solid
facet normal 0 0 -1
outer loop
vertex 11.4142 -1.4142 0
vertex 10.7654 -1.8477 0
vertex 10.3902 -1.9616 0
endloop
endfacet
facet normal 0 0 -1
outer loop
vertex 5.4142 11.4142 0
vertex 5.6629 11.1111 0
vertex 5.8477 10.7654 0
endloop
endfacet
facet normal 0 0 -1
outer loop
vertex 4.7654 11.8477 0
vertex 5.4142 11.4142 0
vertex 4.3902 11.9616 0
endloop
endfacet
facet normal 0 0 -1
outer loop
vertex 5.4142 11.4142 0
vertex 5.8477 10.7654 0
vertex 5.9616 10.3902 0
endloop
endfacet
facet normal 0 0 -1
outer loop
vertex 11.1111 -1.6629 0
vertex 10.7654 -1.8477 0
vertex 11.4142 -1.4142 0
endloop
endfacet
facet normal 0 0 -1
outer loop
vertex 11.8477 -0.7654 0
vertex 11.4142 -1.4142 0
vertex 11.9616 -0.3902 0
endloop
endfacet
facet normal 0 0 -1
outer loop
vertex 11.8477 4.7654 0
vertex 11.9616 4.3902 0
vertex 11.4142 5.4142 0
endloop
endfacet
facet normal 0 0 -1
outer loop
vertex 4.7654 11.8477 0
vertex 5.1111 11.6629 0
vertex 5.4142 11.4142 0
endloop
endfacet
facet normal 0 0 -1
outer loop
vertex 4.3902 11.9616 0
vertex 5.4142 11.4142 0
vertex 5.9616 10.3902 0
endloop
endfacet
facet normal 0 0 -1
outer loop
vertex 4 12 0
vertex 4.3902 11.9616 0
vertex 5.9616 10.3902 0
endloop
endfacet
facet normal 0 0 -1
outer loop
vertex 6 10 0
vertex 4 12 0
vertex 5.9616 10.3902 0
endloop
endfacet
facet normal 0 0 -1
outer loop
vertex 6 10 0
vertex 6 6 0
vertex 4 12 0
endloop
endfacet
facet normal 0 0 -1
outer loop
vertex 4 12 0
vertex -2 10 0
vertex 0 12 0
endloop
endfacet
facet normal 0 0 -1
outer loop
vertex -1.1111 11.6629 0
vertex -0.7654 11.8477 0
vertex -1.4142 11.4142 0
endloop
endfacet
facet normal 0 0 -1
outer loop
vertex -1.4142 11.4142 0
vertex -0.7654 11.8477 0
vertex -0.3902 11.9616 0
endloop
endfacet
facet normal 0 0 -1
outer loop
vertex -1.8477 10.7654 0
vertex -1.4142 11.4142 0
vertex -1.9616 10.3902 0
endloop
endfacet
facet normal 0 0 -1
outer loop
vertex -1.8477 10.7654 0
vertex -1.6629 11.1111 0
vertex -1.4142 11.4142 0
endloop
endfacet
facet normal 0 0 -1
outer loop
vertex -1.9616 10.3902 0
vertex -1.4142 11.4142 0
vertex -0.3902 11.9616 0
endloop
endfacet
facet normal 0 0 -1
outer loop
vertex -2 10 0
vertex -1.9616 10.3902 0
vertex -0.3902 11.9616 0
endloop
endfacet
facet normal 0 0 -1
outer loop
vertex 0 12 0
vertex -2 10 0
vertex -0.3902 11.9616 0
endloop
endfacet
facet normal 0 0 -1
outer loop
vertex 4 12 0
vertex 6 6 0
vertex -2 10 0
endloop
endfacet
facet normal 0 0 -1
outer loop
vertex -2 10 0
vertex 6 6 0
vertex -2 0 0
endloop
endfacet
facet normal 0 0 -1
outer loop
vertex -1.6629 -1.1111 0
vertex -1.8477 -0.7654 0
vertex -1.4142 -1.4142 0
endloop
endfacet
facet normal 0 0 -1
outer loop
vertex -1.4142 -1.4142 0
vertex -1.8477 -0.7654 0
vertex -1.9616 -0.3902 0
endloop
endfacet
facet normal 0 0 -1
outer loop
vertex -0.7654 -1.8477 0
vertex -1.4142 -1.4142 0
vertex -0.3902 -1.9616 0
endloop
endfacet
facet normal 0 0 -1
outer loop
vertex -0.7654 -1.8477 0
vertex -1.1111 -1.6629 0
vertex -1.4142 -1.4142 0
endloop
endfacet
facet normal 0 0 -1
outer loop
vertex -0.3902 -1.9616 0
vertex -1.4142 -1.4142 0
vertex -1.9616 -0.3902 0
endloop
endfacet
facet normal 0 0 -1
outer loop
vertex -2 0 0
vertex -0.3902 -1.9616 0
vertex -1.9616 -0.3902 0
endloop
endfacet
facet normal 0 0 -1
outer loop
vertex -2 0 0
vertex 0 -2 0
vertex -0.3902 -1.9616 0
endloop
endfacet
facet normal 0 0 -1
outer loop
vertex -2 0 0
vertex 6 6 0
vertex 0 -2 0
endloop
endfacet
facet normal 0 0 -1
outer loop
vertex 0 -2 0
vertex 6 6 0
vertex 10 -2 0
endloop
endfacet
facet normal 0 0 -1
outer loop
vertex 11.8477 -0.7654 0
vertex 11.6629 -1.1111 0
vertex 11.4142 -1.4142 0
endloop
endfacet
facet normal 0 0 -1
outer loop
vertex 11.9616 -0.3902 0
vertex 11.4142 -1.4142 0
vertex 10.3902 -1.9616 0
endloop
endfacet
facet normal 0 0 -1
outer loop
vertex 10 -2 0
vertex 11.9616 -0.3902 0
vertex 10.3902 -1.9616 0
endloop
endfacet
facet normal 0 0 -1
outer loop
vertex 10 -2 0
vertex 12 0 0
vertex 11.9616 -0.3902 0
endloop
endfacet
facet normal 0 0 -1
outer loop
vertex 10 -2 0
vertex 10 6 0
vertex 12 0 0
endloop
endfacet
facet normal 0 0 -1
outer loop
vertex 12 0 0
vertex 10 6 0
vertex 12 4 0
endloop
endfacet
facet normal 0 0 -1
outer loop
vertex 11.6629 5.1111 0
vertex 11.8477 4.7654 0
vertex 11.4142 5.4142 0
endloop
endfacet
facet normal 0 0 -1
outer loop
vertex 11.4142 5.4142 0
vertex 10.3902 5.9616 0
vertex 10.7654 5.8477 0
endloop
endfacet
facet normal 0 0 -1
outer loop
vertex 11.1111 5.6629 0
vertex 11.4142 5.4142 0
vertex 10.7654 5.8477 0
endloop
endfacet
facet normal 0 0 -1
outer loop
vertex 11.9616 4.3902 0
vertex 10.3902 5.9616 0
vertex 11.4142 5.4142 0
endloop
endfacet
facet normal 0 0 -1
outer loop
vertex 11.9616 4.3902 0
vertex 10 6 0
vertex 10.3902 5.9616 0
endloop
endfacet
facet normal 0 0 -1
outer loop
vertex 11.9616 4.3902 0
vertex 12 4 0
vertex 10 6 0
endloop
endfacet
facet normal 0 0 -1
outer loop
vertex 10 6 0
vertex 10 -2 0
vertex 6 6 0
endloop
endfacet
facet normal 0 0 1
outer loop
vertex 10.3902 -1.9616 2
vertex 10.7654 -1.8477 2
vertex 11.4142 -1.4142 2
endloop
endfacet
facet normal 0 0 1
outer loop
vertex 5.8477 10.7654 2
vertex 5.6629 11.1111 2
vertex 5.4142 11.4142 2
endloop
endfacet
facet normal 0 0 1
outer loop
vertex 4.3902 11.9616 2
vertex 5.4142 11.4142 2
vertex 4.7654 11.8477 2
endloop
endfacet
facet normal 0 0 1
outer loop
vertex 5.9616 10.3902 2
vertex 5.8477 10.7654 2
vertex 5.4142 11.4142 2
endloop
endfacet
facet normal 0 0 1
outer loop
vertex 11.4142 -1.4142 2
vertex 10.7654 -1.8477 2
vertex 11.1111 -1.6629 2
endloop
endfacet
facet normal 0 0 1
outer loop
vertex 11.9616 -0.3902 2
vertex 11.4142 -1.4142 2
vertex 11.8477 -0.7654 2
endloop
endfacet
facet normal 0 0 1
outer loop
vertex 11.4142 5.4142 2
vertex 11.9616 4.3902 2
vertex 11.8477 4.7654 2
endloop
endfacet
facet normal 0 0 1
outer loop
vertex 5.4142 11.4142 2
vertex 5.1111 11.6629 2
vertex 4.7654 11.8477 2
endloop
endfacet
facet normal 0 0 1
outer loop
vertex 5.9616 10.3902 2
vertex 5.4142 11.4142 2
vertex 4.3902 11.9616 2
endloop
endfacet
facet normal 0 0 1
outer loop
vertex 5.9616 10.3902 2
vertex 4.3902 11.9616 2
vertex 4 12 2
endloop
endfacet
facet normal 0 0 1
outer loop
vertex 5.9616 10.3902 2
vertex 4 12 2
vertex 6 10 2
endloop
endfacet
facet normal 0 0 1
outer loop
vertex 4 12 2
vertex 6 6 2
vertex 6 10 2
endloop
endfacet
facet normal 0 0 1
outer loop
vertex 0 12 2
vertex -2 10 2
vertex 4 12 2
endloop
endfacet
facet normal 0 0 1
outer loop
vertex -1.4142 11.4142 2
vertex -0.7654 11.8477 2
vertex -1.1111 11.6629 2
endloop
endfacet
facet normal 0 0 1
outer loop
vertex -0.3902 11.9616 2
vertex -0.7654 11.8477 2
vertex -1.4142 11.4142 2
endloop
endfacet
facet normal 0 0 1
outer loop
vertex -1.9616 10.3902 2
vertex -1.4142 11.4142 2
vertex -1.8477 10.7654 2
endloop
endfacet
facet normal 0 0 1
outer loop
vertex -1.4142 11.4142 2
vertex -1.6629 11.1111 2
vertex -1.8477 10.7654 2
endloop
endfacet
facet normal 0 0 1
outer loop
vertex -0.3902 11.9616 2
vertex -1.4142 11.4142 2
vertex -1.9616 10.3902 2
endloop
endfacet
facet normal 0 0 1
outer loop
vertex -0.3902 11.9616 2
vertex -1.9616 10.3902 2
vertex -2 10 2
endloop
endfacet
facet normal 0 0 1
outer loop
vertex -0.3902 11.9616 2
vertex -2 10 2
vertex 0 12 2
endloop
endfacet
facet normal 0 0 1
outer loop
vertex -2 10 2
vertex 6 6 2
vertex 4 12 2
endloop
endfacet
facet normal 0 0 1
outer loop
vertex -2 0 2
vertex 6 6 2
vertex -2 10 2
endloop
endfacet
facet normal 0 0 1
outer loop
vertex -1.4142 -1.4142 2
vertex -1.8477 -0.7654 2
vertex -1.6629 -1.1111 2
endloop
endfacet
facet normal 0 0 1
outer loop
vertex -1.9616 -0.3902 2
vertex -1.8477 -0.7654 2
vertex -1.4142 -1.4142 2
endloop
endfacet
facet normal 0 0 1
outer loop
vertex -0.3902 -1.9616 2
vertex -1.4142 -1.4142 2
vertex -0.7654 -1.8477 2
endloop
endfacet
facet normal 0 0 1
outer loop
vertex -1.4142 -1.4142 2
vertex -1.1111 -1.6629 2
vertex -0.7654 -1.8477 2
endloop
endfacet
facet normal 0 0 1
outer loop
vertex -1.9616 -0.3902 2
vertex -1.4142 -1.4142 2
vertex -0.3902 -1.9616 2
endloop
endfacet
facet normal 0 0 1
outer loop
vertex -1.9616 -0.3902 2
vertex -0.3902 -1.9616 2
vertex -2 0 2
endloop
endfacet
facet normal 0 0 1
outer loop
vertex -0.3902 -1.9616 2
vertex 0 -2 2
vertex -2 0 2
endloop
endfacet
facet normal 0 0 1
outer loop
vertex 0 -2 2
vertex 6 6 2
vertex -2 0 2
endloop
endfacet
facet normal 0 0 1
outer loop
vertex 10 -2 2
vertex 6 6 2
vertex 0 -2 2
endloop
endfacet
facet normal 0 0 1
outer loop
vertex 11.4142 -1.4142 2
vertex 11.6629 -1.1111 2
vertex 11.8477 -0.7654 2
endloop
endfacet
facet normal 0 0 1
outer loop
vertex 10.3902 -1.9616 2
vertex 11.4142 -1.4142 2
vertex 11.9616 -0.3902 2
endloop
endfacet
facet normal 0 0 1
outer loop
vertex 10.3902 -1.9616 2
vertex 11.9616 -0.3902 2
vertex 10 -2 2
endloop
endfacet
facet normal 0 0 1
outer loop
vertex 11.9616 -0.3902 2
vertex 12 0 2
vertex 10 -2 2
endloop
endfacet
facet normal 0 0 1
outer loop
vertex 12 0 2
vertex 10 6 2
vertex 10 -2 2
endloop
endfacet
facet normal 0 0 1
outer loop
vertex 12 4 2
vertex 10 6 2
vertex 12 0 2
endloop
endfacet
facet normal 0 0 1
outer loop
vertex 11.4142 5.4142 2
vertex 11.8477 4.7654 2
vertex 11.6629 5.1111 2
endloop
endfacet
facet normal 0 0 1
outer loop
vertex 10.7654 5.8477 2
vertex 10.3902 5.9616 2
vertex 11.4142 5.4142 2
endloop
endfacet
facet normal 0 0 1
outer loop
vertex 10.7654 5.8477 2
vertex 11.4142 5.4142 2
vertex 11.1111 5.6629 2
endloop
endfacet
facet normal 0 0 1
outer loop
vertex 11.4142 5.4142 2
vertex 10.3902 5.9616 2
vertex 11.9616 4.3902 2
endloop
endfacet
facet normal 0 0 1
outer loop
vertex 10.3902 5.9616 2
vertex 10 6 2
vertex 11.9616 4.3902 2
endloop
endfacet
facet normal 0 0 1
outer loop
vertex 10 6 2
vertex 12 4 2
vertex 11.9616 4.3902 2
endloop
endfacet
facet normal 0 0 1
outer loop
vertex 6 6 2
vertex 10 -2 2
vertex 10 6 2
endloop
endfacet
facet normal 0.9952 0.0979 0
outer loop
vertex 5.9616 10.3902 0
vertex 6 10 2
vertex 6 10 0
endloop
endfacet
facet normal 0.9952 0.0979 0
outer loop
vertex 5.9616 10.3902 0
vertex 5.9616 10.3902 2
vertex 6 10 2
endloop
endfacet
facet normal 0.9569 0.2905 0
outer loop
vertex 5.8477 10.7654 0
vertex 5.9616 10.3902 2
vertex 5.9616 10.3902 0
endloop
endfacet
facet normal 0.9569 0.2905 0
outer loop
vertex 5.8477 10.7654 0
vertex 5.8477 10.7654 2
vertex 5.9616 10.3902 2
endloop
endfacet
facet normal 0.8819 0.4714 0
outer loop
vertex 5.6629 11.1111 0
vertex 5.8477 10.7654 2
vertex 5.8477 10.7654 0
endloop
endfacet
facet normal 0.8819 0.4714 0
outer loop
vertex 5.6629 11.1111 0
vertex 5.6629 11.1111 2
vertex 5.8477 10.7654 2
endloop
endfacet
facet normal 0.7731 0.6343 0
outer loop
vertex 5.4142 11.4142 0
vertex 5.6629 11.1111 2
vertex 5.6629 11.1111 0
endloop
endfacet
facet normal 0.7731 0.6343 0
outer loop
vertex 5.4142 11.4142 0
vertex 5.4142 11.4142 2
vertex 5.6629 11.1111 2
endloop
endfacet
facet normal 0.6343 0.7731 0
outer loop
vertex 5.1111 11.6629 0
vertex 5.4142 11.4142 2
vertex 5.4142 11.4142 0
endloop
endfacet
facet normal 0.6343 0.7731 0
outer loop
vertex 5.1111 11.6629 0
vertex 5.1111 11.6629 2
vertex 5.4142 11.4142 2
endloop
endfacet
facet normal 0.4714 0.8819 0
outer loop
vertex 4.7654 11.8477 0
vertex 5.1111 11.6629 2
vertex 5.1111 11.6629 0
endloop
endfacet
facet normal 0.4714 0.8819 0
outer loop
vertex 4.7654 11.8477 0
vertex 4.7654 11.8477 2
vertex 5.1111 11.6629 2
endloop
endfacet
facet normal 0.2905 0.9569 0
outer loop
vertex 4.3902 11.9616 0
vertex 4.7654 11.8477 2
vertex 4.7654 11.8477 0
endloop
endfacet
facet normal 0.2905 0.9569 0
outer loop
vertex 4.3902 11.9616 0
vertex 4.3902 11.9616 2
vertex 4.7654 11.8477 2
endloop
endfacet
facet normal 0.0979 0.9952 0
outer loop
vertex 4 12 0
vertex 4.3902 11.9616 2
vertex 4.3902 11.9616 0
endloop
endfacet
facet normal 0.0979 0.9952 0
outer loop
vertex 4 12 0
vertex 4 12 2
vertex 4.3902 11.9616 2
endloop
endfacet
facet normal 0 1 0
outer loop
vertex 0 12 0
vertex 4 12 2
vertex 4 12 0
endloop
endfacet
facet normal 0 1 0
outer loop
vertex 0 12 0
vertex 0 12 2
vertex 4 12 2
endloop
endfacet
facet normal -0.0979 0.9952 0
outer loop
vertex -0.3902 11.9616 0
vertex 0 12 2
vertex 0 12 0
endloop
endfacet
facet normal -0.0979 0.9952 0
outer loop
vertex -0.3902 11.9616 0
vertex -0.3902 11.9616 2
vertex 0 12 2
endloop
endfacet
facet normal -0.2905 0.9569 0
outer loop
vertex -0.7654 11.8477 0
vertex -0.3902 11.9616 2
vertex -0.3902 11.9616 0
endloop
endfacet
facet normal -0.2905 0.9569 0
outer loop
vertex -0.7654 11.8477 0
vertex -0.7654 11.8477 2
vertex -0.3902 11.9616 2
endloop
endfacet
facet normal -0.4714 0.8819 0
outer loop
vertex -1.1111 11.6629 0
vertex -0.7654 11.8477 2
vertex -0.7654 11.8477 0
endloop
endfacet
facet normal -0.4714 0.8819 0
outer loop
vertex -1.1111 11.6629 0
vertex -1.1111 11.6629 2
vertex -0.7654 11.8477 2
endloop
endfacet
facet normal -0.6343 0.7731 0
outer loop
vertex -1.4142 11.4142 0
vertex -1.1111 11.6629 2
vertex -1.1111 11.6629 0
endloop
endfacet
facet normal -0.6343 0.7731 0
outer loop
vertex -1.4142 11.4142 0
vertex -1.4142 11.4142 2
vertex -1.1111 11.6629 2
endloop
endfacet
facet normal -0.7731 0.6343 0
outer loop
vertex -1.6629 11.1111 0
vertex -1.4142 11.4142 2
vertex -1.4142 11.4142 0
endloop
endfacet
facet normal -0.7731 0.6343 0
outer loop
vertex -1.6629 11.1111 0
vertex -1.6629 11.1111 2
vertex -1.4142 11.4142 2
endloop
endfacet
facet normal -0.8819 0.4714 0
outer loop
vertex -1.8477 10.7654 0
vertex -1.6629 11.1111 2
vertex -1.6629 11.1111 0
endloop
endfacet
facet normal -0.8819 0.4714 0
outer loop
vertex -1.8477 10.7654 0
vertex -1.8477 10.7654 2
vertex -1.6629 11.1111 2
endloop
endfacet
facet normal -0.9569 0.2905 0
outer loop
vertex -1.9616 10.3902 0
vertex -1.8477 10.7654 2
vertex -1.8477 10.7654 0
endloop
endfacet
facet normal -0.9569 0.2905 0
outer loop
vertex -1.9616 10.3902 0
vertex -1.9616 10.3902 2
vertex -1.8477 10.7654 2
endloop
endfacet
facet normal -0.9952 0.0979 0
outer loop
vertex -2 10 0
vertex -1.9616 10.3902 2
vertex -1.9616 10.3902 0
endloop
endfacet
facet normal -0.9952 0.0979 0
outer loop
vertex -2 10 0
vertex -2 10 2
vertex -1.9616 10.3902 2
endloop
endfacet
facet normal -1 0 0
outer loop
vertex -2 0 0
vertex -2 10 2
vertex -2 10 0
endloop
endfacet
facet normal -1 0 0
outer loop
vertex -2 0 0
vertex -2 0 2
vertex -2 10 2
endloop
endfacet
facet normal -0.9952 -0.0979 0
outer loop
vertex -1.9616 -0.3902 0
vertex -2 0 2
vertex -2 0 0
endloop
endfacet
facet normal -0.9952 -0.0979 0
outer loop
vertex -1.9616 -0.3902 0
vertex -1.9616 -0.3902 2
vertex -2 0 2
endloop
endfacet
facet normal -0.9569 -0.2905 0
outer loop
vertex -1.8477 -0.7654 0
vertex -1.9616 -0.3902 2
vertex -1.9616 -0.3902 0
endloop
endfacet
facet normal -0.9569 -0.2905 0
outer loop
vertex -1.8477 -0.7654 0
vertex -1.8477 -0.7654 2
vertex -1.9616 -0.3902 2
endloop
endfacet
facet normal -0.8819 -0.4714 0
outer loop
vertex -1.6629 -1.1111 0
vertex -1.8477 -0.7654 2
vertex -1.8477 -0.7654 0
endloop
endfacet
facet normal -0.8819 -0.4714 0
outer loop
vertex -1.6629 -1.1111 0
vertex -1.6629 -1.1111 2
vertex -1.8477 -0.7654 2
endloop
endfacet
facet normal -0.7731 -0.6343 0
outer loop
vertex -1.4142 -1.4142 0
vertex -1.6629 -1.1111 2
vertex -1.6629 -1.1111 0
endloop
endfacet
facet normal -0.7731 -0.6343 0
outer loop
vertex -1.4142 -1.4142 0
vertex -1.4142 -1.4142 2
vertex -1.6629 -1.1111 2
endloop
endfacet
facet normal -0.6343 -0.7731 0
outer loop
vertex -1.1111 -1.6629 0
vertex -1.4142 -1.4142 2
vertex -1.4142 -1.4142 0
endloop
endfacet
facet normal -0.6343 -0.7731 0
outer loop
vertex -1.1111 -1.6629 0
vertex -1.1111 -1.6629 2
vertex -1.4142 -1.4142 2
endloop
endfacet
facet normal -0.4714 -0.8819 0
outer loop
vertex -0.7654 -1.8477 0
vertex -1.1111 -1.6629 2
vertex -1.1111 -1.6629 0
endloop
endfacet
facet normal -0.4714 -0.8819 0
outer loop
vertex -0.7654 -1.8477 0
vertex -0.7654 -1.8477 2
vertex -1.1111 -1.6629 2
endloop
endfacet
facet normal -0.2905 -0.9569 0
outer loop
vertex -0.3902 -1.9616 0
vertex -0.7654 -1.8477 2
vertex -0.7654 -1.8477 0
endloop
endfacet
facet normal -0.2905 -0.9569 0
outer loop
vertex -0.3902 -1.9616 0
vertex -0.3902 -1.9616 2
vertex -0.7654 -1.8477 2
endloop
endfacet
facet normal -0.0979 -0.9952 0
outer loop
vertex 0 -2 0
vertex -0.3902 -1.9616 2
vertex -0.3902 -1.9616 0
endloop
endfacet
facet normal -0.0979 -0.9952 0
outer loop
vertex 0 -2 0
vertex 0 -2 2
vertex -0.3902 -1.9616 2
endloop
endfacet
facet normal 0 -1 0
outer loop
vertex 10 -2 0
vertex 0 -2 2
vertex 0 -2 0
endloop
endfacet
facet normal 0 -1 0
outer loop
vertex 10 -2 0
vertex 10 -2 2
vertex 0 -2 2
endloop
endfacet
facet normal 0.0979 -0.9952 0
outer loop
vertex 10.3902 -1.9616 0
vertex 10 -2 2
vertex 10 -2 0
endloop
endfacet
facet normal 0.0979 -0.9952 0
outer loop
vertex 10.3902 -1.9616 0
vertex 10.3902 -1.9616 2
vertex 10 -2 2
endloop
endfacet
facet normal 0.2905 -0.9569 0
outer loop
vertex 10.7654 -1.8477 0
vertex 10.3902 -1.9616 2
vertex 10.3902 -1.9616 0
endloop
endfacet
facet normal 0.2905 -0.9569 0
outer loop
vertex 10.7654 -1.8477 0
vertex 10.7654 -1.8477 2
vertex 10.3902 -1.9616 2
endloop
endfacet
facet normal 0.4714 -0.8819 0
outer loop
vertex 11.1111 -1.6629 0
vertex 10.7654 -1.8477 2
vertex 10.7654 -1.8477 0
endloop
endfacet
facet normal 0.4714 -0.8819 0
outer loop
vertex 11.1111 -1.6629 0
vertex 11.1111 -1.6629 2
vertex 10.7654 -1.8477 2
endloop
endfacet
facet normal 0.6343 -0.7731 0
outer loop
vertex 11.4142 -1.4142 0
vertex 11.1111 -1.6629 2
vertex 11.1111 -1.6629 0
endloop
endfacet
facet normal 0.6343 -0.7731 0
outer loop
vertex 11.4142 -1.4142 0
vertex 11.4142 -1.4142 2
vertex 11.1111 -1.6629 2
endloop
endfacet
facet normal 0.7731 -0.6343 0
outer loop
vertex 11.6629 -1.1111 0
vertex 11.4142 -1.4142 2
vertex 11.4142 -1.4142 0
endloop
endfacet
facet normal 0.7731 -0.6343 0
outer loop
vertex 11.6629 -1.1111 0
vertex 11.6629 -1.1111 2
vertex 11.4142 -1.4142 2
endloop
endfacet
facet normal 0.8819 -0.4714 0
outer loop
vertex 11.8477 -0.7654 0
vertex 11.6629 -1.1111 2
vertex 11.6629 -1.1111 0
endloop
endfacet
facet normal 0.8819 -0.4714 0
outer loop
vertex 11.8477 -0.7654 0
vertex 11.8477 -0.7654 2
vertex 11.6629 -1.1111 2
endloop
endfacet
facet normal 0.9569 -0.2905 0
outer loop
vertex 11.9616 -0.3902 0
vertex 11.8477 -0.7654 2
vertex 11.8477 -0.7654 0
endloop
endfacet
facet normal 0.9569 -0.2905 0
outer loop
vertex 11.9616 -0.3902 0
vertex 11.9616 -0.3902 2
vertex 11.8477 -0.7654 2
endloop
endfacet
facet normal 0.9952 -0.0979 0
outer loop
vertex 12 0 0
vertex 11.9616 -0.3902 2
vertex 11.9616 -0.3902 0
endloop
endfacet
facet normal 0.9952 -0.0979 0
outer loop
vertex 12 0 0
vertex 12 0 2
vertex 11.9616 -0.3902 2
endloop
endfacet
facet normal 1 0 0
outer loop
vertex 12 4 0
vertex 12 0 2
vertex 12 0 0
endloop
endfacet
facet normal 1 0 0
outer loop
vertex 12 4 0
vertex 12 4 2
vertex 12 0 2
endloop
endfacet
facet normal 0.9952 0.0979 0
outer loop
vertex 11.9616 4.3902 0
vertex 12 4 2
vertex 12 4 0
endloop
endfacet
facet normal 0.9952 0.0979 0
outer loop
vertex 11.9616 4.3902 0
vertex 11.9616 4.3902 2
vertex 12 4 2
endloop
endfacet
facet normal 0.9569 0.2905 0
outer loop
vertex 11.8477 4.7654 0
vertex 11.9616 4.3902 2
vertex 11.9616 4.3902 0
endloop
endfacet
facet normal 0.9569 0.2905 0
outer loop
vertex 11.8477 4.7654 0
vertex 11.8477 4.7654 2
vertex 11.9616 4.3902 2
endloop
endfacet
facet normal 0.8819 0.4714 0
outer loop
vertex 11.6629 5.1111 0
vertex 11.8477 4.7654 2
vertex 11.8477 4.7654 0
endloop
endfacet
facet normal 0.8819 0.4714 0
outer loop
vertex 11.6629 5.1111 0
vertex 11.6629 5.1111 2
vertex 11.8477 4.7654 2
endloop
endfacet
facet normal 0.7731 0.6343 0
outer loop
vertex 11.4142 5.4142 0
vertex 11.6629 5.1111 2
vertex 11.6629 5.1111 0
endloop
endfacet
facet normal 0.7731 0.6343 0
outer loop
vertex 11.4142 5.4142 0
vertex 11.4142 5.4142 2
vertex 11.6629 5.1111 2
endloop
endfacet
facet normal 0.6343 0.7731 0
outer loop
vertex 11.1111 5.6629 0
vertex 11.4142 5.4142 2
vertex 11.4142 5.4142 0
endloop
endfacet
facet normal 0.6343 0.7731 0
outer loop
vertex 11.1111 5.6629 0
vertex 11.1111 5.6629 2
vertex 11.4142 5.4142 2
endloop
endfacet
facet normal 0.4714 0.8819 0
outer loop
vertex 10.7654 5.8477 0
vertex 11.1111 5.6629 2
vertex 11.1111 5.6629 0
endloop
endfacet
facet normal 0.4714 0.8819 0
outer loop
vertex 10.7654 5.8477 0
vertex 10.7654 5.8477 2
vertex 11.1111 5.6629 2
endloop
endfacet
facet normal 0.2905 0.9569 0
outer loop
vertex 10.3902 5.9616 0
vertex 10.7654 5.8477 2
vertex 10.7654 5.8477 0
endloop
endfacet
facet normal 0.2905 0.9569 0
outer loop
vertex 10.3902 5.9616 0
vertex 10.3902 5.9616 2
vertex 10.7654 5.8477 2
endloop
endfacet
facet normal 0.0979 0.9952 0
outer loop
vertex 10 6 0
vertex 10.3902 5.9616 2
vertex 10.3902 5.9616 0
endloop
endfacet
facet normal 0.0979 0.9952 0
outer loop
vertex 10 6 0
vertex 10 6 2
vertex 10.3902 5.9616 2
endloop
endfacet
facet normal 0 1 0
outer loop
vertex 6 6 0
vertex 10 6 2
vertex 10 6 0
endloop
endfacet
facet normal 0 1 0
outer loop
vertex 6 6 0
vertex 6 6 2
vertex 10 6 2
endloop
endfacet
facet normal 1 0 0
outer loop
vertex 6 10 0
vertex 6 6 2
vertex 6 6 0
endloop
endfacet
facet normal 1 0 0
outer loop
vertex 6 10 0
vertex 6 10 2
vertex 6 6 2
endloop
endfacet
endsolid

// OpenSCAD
// Non-convex 2D Minkowski: an L-shape rounded by a circle, then extruded.
linear_extrude(2) minkowski() {
    polygon([[0,0],[10,0],[10,4],[4,4],[4,10],[0,10]]);
    circle(2, $fn = 32);
}
